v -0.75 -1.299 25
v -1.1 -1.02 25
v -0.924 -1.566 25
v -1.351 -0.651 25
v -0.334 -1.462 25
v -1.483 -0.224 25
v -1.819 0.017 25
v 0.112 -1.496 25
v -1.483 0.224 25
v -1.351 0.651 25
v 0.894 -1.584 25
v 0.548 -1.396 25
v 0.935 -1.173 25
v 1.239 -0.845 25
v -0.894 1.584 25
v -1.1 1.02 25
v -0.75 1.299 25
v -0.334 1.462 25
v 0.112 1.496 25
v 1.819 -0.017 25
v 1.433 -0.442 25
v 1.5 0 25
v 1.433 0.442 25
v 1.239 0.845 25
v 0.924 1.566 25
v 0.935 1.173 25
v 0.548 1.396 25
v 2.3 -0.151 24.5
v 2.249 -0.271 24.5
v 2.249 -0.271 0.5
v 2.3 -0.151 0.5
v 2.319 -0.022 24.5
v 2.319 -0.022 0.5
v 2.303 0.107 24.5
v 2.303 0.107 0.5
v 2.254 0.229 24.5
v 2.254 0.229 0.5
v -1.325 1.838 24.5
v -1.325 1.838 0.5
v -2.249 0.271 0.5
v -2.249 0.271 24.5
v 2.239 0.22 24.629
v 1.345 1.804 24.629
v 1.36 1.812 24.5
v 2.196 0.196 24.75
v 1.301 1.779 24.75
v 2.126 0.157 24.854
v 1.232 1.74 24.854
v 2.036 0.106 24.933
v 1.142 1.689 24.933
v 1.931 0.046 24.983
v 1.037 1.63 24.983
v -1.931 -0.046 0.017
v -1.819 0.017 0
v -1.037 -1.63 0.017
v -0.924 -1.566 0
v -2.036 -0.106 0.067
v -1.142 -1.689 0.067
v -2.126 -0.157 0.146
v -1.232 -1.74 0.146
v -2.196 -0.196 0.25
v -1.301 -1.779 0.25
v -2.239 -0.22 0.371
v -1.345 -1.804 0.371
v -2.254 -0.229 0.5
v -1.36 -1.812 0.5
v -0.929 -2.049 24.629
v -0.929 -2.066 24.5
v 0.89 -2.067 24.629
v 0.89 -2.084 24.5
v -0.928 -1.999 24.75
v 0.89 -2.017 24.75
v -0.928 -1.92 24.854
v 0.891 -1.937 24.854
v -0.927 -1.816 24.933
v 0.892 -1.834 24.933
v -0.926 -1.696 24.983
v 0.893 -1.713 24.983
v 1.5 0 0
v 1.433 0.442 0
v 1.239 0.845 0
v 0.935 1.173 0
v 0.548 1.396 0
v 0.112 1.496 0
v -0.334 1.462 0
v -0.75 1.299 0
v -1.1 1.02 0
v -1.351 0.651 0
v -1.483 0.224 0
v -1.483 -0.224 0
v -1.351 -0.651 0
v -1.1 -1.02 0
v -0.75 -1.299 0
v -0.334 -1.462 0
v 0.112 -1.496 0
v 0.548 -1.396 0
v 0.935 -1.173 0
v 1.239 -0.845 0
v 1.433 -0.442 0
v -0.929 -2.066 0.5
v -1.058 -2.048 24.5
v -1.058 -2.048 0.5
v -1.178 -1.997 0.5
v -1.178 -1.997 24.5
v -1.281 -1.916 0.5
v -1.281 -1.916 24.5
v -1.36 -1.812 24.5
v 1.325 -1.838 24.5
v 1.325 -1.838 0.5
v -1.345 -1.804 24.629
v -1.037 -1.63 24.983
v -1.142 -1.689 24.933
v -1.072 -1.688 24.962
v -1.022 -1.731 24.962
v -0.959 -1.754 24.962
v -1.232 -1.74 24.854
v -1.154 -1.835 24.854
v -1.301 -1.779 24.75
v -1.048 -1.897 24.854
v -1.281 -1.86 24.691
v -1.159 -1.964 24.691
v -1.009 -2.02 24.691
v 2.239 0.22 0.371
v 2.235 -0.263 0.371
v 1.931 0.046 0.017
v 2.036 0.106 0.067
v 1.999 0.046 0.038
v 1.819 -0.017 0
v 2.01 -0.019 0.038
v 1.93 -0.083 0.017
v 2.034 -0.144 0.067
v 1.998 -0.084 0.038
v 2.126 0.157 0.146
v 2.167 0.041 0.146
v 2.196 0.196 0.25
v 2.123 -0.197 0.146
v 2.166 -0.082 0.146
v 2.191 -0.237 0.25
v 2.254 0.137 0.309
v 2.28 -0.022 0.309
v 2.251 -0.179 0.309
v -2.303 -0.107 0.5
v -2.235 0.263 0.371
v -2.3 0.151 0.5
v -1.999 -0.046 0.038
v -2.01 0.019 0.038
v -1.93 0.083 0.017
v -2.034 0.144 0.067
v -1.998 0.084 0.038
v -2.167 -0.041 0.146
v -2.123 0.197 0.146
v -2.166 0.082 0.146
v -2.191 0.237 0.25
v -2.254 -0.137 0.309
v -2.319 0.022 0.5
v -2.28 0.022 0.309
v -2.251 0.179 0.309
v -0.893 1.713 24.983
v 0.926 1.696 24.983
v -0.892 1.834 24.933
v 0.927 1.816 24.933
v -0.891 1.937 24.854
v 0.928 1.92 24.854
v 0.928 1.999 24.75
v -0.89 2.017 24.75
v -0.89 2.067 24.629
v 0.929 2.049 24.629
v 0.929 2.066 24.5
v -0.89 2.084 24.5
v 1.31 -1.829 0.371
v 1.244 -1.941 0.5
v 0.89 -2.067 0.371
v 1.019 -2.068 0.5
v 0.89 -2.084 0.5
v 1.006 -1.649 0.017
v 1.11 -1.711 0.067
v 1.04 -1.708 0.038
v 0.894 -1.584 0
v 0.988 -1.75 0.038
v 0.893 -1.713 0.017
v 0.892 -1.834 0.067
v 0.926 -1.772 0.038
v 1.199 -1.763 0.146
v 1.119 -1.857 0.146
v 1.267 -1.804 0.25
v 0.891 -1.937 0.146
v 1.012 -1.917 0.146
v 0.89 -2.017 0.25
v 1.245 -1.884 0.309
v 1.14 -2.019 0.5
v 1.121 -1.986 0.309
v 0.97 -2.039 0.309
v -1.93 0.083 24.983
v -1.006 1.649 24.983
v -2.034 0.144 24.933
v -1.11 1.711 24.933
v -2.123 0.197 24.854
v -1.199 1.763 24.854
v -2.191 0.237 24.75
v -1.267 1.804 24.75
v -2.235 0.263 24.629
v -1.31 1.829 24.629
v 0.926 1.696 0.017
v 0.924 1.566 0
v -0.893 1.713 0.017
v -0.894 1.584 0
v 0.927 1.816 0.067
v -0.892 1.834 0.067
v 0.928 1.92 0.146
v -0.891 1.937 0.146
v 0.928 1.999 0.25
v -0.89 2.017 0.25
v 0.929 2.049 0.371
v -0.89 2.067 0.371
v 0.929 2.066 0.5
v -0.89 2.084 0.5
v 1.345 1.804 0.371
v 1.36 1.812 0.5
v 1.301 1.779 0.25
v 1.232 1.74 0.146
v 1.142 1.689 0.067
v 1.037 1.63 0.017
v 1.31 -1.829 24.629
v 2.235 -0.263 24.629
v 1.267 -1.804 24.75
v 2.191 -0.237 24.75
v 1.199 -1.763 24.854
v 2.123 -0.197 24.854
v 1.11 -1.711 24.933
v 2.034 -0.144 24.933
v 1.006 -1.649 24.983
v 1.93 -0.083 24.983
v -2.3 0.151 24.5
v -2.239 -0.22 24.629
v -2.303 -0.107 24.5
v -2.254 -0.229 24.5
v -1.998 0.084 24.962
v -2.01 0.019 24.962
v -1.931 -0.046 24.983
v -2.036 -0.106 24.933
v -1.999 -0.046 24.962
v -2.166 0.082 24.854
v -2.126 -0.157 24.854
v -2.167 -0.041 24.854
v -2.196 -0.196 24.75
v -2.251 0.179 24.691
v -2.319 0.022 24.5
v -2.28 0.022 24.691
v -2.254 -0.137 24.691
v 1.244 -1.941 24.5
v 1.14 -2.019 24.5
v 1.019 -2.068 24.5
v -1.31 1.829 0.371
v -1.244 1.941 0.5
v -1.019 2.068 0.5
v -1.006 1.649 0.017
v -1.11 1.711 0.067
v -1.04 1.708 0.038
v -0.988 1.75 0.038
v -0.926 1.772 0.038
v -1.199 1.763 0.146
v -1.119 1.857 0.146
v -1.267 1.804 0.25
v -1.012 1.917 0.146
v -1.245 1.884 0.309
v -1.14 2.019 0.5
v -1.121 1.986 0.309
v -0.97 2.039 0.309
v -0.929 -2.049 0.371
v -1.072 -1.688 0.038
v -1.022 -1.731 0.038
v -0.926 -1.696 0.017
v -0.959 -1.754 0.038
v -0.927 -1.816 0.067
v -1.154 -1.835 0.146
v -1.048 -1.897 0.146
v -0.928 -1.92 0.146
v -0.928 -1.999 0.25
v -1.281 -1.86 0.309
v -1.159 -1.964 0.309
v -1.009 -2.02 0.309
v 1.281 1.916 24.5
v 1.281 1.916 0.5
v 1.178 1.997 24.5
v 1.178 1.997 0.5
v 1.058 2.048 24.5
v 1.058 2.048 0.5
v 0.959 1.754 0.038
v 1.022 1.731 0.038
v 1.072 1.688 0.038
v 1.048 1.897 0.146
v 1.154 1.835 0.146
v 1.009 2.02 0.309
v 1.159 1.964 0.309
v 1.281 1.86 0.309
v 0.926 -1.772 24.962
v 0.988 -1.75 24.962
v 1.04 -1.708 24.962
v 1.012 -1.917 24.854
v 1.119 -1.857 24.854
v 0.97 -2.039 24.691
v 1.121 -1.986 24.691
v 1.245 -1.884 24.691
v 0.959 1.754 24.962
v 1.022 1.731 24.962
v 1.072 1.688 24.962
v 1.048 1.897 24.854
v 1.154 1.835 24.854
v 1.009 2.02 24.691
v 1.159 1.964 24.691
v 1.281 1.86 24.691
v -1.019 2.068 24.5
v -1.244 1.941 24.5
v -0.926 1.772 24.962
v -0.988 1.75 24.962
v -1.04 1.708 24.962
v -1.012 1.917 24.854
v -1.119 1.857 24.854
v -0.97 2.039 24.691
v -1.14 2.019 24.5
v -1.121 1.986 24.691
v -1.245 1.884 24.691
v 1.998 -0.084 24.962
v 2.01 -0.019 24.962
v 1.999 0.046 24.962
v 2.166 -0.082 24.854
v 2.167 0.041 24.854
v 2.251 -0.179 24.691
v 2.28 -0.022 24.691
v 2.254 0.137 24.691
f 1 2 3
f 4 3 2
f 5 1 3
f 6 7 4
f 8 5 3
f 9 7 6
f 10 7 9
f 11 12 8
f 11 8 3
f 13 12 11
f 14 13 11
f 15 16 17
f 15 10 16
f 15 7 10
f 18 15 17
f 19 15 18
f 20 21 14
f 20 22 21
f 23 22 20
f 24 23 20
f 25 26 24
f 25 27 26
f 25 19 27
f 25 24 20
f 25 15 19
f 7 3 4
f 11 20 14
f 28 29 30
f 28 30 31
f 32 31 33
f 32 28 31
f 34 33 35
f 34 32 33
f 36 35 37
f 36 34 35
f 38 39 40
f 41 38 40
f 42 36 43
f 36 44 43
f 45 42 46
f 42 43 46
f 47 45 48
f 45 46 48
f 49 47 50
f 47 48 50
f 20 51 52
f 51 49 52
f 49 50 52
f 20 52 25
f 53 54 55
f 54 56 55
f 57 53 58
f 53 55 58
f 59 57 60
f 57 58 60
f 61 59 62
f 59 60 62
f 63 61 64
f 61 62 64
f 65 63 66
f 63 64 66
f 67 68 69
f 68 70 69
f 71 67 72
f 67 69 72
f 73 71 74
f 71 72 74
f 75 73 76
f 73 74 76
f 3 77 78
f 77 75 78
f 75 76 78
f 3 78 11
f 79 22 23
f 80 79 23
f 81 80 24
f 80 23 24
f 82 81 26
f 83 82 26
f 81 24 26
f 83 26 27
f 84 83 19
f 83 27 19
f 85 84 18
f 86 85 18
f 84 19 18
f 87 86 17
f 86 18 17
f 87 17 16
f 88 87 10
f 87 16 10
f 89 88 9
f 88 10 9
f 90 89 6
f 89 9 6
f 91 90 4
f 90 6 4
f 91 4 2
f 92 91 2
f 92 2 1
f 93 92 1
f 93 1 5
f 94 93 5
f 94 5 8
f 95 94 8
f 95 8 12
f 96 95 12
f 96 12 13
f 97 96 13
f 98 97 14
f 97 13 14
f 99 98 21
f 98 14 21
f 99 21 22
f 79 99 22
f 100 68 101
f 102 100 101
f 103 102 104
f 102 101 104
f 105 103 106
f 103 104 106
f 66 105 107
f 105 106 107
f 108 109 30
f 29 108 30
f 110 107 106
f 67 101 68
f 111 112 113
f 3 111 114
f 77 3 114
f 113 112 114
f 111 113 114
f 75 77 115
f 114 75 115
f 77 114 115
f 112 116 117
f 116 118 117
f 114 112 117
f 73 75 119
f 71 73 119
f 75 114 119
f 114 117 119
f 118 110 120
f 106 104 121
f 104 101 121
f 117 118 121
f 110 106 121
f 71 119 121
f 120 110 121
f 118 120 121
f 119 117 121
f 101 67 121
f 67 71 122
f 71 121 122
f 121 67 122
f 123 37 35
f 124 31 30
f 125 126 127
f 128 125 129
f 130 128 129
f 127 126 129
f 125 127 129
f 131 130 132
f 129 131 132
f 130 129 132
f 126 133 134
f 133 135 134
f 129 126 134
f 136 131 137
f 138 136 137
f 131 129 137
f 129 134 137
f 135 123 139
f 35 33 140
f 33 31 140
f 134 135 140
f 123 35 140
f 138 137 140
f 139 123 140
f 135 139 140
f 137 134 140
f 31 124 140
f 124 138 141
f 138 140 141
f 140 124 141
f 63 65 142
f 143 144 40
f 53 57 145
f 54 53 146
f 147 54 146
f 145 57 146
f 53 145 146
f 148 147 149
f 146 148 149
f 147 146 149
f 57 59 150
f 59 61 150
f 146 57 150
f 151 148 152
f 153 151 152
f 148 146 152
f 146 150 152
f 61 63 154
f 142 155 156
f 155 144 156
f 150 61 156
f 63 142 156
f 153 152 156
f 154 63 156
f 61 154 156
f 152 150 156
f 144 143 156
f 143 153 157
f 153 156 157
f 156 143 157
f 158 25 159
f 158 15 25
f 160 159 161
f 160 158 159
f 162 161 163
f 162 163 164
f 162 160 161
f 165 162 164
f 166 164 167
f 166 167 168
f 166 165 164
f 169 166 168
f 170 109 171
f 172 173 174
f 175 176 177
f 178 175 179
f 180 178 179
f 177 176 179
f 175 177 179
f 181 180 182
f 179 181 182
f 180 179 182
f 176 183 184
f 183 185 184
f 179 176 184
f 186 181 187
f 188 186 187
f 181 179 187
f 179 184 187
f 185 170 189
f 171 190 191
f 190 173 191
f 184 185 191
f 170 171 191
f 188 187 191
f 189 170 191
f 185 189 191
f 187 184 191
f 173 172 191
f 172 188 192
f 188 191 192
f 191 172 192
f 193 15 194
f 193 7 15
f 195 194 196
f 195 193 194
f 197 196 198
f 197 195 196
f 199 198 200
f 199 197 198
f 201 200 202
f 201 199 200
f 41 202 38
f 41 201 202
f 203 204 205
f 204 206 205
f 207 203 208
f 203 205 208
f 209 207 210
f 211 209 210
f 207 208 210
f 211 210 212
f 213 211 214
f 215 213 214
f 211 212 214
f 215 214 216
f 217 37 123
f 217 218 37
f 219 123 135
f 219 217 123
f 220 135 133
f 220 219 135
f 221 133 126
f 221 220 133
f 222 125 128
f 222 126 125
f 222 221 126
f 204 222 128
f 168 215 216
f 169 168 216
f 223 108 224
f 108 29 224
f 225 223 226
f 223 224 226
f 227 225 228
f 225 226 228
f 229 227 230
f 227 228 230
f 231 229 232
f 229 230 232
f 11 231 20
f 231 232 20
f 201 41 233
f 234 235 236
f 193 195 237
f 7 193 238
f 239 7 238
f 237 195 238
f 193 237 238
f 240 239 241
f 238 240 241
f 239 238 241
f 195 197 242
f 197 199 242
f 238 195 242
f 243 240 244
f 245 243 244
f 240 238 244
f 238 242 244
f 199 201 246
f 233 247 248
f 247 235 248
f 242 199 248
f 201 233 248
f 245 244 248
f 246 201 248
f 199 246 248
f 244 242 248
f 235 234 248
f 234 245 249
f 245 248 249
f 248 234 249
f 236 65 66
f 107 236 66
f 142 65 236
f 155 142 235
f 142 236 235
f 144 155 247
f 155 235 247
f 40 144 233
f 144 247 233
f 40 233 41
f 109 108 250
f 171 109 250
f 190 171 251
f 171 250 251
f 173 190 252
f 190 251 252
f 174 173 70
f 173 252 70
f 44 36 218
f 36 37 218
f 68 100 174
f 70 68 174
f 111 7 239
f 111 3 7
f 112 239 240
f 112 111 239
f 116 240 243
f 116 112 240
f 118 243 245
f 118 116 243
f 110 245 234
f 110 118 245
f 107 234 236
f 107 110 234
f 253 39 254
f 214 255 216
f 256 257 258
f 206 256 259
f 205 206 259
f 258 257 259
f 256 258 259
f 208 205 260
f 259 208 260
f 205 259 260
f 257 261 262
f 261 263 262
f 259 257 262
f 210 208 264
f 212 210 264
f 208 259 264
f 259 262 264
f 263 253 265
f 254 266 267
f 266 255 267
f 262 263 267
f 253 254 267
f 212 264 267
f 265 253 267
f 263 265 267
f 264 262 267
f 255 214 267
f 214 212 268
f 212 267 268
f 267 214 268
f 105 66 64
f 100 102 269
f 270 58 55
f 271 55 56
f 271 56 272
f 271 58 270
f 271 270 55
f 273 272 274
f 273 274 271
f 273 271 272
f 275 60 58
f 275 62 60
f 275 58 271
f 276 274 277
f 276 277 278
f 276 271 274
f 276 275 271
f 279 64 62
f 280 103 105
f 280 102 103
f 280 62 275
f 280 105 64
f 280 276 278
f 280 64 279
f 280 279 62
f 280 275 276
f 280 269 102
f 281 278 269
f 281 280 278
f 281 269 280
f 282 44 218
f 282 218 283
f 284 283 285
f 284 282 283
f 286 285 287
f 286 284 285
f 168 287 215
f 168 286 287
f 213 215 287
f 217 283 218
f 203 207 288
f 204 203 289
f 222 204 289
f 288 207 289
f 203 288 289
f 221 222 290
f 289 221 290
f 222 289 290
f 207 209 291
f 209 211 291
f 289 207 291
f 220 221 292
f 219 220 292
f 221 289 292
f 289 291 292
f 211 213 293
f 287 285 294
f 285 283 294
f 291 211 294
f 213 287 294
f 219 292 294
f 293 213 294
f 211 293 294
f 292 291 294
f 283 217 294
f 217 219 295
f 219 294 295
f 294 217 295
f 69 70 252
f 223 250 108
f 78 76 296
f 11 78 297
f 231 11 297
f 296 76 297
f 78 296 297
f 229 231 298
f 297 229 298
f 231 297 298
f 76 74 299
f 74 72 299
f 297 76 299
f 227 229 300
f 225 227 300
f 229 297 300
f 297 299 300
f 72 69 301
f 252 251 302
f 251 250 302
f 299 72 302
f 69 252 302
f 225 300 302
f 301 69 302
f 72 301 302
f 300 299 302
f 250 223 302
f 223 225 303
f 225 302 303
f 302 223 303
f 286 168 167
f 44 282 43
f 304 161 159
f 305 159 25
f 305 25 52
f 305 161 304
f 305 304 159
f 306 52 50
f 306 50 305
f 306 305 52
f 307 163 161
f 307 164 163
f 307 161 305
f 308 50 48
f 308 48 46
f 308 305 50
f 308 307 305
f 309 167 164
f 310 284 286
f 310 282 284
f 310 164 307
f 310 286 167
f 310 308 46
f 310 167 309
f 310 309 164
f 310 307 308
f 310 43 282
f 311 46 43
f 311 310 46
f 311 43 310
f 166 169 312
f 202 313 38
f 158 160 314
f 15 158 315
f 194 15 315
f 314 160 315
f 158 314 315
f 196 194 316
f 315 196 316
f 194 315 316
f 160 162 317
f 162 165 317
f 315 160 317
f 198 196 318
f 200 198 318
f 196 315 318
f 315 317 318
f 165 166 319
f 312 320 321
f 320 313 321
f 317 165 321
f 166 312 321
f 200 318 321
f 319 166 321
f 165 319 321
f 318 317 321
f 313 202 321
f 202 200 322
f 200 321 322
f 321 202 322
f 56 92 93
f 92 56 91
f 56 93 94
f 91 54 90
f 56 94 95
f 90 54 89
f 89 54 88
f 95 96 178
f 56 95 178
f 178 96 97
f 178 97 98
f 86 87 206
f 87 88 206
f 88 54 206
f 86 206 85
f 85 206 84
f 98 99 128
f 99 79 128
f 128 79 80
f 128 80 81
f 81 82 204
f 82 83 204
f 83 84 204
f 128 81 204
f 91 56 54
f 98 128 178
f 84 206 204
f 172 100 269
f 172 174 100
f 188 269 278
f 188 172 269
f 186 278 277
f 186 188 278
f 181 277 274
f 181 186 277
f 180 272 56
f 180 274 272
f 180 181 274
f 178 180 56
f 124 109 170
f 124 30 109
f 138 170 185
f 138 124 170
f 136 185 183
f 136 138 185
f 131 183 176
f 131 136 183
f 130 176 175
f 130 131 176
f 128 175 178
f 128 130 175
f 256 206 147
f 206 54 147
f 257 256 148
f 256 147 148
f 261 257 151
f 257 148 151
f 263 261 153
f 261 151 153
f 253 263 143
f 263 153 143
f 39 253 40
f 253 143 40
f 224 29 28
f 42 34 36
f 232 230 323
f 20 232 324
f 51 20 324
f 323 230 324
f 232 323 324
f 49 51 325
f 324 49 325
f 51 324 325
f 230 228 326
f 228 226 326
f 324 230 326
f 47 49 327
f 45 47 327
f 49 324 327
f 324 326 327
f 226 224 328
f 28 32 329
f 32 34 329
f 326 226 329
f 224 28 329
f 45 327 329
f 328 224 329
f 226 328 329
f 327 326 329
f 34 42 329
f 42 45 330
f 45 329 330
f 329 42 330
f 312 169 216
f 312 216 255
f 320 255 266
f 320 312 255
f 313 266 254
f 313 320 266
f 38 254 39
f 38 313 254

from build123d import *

# Parameters (mm, degrees)
SALIENTE_EXTRUIR1_DEPTH = 25
CROQUIS3_R              = 1.5
CORTAR_EXTRUIR1_DEPTH   = 25
REDONDEO1_R             = 0.5


with BuildPart() as part:
    # Croquis1 → Saliente-Extruir1 (new body)
    with BuildSketch(Plane.XY):
        Polygon((1.178162087, -2.086328696), (2.395894695, -0.022846051), (1.217732608, 2.063482646), (-1.178162087, 2.086328696), (-2.395894695, 0.022846051), (-1.217732608, -2.063482646), align=None)
    extrude(amount=SALIENTE_EXTRUIR1_DEPTH)

    # Croquis3 → Cortar-Extruir1 (cut)
    with BuildSketch(Plane.XY.offset(25)):
        Circle(CROQUIS3_R)
    extrude(amount=-CORTAR_EXTRUIR1_DEPTH, mode=Mode.SUBTRACT)

    # Redondeo1
    redondeo1_edges = [part.edges().sort_by_distance(p)[0] for p in [
        (1.806813652, 1.020318297, 25),
        (-1.217732608, -2.063482646, 12.5),
        (-2.395894695, 0.022846051, 12.5),
        (-1.178162087, 2.086328696, 12.5),
        (1.217732608, 2.063482646, 12.5),
        (2.395894695, -0.022846051, 12.5),
        (1.178162087, -2.086328696, 12.5),
        (0.01978526, 2.074905671, 25),
        (-1.787028391, 1.054587374, 25),
        (-1.806813652, -1.020318297, 25),
        (-0.01978526, -2.074905671, 25),
        (-1.806813652, -1.020318297, 0),
        (-1.787028391, 1.054587374, 0),
        (0.01978526, 2.074905671, 0),
        (1.787028391, -1.054587374, 25),
        (1.806813652, 1.020318297, 0),
        (1.787028391, -1.054587374, 0),
        (-0.01978526, -2.074905671, 0),
    ]]
    fillet(redondeo1_edges, radius=REDONDEO1_R)


solid = part.part
